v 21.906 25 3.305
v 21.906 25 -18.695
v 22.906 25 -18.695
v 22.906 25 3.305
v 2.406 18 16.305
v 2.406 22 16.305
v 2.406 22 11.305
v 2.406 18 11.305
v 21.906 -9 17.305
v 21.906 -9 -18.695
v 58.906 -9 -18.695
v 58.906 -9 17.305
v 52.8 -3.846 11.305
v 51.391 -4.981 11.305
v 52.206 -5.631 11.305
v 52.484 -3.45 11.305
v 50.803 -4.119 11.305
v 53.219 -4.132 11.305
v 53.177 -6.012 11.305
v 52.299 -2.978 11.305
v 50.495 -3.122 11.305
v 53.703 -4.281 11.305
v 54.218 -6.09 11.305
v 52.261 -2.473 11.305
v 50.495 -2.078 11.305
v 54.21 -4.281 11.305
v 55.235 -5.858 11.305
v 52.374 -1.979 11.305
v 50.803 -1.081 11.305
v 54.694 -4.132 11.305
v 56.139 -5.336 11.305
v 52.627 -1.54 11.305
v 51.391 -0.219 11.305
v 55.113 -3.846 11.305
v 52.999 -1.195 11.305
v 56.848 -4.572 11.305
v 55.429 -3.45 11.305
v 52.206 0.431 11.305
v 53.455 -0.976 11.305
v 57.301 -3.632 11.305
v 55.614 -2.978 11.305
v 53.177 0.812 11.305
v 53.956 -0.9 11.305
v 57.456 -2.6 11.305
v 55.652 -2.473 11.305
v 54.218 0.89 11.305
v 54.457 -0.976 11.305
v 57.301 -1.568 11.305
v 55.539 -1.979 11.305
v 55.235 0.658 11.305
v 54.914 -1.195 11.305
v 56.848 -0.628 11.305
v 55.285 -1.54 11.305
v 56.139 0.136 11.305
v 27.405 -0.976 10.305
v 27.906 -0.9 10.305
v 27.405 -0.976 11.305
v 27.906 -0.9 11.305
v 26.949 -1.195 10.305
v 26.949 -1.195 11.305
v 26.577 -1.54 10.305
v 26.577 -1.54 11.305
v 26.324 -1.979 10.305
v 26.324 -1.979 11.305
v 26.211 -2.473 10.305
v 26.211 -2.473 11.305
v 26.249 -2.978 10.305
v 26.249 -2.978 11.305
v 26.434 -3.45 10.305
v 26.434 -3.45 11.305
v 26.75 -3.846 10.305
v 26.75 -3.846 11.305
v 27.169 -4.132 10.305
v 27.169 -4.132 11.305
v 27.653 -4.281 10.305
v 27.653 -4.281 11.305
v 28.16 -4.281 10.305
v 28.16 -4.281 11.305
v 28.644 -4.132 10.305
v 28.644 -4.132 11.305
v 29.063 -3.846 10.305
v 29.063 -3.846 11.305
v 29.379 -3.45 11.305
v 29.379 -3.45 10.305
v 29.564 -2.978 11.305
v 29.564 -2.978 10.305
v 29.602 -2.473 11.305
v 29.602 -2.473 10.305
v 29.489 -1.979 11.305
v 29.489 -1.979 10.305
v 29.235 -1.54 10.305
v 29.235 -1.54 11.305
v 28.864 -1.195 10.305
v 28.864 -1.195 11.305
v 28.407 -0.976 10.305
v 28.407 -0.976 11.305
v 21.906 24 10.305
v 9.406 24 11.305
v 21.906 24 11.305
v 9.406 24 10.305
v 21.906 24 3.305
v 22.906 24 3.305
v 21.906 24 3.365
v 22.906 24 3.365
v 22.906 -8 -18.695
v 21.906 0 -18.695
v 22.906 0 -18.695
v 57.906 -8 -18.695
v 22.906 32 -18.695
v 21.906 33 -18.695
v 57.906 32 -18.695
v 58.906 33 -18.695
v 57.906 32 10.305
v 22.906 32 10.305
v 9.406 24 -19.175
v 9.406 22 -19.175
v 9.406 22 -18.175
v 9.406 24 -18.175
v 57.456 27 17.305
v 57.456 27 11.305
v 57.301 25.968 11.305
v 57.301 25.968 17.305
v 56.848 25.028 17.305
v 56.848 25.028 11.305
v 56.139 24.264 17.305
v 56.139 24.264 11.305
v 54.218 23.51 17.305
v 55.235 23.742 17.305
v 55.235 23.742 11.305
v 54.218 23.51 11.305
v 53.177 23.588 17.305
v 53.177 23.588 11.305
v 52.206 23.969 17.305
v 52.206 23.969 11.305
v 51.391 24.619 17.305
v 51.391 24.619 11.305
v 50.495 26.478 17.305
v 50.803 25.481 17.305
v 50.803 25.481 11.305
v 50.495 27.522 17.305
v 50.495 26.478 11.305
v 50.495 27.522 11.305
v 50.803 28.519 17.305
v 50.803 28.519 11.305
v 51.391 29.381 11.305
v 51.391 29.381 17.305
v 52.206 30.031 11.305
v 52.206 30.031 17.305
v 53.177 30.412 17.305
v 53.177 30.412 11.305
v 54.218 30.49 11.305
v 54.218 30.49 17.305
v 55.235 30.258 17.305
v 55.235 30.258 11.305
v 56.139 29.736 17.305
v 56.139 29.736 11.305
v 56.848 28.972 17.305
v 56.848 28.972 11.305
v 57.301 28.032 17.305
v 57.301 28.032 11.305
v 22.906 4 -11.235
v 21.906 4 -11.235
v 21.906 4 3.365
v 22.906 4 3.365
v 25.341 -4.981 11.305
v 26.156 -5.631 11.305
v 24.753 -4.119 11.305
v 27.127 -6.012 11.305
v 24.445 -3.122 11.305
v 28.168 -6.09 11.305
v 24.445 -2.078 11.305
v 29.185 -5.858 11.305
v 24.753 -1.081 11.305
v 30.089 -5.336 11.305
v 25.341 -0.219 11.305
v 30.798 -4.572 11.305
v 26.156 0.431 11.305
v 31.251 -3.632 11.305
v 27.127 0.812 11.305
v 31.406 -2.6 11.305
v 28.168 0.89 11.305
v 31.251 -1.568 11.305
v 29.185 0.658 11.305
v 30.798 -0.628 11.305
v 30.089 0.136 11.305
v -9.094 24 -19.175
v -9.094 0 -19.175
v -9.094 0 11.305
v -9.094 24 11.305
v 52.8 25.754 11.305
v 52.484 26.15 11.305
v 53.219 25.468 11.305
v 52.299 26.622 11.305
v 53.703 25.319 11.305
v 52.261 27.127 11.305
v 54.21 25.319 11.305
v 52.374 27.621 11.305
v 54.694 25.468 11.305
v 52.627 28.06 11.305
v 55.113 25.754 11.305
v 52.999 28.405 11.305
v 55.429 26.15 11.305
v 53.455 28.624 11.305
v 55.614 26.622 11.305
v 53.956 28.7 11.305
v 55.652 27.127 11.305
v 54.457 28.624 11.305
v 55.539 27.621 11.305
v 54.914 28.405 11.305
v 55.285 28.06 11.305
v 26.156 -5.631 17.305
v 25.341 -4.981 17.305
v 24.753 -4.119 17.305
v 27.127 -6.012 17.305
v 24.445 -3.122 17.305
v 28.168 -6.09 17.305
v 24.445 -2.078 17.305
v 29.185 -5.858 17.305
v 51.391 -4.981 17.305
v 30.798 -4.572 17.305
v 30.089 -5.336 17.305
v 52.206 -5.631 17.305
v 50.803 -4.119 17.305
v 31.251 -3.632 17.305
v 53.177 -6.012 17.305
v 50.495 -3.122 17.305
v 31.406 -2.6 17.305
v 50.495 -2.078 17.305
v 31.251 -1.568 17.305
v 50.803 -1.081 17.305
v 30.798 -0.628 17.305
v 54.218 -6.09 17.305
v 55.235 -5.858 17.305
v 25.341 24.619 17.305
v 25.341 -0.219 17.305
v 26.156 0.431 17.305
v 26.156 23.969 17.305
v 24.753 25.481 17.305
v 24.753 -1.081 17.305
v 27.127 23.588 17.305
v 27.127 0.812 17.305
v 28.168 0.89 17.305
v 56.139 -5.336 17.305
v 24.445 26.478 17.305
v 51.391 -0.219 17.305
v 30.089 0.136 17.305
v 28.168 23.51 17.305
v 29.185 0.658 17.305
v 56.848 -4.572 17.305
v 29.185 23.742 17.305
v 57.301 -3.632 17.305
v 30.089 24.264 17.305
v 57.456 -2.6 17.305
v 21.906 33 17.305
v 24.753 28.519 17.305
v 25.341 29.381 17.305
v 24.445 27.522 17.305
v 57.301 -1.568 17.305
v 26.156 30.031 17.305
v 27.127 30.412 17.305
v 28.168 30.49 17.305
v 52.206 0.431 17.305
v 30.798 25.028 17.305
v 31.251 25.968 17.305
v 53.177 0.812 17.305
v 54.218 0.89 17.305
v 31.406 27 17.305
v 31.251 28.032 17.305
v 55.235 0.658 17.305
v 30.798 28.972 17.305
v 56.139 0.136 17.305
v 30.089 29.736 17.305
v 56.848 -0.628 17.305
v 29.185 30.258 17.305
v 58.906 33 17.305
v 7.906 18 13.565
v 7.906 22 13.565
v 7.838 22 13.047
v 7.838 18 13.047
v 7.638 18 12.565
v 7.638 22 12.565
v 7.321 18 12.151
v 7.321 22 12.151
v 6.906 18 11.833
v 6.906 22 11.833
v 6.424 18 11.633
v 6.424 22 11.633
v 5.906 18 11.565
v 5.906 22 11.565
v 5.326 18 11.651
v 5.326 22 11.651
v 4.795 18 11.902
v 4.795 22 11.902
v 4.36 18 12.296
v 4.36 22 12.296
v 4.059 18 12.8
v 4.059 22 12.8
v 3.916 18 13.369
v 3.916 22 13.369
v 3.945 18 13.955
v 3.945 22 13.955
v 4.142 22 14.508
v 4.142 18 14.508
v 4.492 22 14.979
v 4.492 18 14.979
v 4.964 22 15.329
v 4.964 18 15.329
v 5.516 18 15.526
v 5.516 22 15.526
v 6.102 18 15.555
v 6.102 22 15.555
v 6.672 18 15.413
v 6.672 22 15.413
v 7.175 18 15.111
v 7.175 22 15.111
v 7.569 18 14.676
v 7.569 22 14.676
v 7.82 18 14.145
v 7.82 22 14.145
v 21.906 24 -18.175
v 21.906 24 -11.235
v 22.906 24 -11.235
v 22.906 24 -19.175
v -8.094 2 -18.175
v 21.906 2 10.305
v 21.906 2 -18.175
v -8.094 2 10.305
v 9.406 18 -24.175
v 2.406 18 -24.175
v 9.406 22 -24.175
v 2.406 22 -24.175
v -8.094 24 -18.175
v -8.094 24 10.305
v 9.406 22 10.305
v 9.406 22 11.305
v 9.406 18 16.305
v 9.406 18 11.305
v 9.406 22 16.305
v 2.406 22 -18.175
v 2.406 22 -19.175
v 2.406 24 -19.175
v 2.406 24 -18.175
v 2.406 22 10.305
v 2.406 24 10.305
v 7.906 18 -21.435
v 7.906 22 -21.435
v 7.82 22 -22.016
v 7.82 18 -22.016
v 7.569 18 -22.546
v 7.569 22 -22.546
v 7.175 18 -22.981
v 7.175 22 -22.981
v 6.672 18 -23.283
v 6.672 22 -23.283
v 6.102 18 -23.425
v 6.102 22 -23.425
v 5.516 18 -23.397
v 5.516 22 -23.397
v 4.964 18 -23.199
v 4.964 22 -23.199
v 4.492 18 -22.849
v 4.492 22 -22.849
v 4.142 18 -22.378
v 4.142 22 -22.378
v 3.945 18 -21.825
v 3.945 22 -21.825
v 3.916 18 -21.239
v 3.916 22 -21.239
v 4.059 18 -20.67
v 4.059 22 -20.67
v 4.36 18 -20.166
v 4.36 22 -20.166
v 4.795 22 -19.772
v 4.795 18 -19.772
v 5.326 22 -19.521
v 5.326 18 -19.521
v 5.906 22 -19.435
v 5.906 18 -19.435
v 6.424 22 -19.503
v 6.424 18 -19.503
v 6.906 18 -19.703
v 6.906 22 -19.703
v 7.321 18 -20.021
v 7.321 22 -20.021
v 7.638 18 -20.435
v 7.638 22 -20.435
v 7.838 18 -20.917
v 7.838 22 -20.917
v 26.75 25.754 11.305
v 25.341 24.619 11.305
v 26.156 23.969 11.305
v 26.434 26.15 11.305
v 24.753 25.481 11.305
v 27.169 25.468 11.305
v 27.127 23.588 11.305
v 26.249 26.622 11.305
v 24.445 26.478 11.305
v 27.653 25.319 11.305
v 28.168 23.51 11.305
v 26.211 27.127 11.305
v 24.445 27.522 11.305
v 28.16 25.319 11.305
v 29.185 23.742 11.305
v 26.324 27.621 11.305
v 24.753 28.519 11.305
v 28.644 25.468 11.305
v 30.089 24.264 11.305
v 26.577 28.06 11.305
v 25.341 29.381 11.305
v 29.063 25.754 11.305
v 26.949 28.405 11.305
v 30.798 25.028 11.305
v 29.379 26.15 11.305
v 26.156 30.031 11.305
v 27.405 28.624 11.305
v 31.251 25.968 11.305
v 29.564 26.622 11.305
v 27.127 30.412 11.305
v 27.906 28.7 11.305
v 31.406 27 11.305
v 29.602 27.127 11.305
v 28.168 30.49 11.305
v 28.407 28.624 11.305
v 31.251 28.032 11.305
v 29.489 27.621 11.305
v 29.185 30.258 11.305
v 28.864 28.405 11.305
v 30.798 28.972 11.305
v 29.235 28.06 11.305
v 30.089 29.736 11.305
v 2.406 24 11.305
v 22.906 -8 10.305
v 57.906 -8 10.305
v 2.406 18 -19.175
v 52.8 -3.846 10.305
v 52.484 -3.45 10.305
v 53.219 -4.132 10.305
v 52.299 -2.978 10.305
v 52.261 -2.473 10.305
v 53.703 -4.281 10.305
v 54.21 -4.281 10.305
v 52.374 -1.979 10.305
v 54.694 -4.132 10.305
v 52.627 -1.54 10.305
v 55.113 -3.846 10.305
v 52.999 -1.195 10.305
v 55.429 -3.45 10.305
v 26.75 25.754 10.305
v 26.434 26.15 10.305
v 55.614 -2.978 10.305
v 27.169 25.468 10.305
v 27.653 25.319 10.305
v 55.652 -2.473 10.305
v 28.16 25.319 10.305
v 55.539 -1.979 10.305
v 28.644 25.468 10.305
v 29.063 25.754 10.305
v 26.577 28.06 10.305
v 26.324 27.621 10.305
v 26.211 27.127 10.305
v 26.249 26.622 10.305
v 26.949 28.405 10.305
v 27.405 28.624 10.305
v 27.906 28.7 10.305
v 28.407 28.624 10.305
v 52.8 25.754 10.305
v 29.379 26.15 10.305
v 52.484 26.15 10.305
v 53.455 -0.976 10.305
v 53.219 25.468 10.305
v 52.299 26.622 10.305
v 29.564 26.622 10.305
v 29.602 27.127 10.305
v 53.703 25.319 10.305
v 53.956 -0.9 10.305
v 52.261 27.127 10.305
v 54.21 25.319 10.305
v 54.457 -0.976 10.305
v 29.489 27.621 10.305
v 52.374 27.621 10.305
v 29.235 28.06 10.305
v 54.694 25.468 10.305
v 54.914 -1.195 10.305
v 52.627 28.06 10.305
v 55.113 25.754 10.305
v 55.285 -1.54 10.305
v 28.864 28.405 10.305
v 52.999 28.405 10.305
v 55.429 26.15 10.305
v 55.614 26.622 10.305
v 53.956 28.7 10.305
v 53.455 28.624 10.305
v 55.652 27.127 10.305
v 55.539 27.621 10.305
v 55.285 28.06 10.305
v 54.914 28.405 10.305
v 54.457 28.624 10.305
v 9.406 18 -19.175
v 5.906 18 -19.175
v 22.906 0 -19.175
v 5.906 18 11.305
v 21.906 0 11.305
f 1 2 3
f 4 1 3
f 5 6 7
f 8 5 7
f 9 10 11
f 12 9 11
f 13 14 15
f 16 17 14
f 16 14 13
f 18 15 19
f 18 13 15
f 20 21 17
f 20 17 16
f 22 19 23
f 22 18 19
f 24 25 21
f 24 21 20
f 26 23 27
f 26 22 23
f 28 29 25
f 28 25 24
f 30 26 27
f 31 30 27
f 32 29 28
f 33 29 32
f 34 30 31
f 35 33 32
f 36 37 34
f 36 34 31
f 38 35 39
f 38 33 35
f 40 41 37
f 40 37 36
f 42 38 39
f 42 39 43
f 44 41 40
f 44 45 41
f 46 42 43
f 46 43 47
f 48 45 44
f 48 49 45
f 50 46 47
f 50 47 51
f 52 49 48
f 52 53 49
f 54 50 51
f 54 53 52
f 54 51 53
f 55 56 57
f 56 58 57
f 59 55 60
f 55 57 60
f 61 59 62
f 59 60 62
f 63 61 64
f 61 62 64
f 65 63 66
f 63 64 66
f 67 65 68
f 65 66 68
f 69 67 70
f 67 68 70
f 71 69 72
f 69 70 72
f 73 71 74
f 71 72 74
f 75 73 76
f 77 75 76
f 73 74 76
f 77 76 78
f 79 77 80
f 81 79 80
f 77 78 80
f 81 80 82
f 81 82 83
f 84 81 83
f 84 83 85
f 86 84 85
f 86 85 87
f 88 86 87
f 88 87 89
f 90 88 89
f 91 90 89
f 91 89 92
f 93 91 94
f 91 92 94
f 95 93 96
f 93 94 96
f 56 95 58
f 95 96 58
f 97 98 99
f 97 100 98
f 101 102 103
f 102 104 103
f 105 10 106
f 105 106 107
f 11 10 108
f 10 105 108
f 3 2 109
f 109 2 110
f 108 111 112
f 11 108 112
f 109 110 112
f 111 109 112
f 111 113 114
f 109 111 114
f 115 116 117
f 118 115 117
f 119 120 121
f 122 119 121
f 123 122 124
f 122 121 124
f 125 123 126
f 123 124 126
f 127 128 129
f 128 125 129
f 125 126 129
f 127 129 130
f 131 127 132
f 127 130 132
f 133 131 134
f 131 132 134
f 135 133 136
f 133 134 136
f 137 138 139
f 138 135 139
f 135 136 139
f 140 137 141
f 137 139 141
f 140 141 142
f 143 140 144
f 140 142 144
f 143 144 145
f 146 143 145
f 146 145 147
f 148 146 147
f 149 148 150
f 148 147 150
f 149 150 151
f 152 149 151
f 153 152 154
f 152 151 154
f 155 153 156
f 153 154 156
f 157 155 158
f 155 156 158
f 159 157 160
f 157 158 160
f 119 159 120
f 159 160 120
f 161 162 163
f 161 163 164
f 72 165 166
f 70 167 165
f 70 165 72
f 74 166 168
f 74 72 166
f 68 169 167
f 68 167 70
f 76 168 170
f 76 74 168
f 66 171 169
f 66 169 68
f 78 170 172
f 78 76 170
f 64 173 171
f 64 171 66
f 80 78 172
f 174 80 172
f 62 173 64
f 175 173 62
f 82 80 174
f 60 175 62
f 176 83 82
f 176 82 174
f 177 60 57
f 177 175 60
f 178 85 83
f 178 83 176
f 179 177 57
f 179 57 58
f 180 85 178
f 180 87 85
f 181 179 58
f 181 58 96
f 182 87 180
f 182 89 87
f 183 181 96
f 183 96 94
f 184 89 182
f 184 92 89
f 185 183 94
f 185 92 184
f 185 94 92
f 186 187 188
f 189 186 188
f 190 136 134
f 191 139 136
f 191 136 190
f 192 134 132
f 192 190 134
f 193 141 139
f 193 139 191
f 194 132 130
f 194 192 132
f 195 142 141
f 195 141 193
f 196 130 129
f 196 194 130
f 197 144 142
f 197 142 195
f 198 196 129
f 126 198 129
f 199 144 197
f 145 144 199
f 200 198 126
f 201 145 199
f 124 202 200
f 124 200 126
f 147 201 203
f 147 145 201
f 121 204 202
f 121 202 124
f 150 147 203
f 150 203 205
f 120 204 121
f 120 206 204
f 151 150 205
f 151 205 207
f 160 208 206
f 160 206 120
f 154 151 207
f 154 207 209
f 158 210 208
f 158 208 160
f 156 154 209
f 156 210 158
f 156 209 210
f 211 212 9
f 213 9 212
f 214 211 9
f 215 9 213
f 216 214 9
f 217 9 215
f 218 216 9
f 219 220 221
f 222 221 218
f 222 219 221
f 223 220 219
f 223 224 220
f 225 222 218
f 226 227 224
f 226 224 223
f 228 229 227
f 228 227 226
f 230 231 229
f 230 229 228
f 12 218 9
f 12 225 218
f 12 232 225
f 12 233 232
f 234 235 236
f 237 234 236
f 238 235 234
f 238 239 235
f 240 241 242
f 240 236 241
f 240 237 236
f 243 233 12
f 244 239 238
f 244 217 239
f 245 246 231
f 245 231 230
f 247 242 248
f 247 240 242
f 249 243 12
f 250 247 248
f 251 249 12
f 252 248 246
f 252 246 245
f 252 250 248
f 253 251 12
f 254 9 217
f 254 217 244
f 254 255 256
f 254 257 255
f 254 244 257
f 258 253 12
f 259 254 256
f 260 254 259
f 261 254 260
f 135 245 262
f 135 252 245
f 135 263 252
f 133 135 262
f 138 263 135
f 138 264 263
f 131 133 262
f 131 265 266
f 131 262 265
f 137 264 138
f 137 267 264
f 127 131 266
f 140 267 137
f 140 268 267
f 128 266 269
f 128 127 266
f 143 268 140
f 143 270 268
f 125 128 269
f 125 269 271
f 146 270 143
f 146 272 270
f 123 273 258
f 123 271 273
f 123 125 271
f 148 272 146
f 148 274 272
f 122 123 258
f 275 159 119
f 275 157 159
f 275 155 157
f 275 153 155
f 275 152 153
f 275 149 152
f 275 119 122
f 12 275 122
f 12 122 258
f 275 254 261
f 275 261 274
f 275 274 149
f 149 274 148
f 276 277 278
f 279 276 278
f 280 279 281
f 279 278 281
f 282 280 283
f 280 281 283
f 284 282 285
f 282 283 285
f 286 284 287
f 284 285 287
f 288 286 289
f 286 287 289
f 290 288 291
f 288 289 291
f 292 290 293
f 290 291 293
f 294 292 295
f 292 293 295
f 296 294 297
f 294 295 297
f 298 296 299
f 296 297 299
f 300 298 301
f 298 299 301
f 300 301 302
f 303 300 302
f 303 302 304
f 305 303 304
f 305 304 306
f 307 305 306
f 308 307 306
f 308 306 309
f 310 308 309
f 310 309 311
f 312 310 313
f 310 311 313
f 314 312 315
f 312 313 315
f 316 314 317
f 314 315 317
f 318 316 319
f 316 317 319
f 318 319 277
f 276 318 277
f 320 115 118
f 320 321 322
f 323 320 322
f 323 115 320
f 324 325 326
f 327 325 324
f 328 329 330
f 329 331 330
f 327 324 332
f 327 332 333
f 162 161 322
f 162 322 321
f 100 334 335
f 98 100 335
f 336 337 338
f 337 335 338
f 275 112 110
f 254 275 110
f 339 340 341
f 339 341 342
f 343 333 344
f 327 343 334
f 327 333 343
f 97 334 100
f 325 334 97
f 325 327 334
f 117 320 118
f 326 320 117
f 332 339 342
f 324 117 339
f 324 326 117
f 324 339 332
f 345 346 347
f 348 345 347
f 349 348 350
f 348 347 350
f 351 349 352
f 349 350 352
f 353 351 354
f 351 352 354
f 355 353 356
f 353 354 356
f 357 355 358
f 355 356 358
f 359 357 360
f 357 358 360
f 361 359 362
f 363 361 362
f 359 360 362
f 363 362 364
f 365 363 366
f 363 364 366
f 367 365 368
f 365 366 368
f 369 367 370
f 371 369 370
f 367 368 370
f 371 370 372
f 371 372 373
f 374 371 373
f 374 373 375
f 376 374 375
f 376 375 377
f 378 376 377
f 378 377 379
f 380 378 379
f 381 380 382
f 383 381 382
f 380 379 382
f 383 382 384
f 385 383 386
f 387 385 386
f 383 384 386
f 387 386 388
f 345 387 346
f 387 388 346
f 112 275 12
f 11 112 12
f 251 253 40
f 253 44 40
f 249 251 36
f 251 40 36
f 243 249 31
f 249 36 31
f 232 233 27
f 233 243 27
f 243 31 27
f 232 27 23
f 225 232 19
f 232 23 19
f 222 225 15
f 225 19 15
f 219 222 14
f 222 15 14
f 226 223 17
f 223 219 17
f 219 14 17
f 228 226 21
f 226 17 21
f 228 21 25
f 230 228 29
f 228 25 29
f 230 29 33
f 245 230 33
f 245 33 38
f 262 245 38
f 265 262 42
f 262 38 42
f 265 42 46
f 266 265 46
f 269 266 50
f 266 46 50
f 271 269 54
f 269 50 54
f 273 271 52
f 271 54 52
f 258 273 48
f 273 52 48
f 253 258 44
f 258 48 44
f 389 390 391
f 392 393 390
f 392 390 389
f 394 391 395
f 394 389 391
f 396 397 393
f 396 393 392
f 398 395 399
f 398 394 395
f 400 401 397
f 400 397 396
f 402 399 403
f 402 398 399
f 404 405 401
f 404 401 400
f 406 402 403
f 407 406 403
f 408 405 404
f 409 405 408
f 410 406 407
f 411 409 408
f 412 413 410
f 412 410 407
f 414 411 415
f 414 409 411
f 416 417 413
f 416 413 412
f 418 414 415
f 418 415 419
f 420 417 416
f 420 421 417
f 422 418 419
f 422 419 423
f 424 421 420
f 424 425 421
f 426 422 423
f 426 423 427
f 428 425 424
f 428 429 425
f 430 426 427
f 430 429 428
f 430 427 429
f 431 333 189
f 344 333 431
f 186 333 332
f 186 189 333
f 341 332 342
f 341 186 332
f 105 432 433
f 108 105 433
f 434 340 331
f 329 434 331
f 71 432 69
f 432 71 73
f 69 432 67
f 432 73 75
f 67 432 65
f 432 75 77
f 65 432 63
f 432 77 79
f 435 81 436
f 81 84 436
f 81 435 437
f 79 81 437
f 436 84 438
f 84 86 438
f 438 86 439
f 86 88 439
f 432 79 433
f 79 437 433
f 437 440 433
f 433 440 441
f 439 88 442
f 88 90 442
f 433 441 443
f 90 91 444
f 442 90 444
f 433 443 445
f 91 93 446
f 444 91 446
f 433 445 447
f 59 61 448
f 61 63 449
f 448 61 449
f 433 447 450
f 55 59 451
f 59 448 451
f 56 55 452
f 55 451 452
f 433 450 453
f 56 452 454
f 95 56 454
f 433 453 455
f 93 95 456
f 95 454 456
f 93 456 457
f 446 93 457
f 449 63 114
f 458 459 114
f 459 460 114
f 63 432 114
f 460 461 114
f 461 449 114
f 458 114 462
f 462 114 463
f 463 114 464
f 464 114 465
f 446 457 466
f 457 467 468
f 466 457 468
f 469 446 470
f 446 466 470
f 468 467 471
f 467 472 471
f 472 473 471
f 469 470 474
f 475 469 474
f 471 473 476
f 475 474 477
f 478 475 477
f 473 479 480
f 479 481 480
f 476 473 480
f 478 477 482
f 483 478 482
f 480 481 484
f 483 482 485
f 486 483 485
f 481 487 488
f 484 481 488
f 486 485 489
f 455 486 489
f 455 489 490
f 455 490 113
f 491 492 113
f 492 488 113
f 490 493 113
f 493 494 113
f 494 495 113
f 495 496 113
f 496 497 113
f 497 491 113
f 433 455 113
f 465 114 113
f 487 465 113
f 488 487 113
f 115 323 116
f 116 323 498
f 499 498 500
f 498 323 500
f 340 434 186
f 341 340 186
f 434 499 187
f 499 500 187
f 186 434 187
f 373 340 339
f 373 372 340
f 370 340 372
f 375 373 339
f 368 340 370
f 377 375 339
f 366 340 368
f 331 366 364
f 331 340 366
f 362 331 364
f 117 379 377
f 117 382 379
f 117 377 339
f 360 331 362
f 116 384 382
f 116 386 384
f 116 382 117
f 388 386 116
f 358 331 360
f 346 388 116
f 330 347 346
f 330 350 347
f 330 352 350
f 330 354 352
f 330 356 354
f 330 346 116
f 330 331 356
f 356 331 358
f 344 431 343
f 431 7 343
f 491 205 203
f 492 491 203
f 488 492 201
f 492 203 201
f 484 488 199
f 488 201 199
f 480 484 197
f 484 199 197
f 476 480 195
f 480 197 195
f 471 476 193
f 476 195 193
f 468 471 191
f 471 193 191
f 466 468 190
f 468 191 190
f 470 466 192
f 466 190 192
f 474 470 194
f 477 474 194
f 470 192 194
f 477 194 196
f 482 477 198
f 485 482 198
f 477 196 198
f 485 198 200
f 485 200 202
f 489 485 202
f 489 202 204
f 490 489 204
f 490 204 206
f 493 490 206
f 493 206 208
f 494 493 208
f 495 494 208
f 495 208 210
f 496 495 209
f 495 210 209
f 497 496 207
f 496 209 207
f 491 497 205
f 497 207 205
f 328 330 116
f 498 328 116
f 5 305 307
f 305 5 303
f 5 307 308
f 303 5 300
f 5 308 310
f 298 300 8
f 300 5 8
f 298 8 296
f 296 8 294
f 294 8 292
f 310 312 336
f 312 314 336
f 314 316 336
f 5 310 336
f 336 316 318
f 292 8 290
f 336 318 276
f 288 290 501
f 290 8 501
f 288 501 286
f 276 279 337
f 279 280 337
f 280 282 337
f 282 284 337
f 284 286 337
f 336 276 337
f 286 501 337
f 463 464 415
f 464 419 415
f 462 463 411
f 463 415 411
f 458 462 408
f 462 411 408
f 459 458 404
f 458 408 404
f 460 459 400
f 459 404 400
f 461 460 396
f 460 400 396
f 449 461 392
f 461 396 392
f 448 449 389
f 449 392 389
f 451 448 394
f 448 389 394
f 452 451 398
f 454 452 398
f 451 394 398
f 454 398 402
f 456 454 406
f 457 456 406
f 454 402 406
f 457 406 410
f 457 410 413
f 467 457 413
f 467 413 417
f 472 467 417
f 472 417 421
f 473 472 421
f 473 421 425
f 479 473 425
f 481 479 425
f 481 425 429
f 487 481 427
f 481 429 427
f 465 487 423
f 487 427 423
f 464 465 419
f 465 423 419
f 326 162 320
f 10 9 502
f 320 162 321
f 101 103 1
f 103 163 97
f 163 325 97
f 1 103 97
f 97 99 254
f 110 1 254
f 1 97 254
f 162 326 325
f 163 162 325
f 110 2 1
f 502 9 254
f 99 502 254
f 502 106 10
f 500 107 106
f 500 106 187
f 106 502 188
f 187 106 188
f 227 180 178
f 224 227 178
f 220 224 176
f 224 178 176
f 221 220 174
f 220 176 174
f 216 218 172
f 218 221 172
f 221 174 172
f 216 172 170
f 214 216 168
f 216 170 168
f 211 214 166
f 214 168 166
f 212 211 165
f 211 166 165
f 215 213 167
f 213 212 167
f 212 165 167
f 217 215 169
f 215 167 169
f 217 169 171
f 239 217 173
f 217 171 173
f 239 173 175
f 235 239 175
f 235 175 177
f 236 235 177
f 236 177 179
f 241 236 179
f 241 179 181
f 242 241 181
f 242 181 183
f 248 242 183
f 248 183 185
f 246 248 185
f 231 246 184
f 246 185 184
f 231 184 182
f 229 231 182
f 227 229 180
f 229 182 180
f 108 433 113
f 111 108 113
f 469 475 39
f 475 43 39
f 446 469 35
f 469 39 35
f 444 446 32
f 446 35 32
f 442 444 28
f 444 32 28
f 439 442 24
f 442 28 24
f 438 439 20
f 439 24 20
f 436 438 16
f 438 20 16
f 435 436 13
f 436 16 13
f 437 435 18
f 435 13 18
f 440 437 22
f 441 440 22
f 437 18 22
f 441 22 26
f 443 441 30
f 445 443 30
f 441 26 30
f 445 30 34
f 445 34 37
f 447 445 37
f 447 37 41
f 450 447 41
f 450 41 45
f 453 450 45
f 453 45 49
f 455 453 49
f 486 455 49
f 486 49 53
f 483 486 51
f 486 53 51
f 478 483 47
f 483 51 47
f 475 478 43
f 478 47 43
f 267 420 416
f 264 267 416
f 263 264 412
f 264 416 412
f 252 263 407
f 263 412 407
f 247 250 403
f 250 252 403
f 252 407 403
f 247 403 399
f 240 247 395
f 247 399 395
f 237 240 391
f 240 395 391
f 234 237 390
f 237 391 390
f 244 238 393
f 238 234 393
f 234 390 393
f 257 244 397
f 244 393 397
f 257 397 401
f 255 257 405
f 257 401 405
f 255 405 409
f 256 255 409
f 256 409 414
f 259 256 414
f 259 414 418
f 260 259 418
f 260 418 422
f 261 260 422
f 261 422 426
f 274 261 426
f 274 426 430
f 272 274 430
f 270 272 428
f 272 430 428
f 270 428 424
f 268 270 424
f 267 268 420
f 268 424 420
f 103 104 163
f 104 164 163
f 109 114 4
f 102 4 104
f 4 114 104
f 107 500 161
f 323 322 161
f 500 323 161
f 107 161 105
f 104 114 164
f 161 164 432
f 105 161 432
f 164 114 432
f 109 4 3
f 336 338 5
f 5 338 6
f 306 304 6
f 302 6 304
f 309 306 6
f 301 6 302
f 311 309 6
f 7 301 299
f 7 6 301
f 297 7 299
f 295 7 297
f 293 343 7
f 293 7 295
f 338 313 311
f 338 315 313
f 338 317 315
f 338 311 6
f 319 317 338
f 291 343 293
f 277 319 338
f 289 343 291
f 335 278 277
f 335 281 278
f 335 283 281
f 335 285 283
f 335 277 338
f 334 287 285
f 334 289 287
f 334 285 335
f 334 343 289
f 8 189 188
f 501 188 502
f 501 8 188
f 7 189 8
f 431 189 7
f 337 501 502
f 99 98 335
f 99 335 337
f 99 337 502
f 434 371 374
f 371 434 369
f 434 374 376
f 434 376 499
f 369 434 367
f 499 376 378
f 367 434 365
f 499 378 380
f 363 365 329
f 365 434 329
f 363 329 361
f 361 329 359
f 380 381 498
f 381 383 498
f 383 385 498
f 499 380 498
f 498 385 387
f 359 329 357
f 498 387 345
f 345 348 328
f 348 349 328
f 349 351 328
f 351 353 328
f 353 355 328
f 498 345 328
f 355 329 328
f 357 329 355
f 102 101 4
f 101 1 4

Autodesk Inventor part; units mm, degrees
ref_plane "YZ Plane" through (0, 0, 0) normal (1, 0, 0) x (0, 1, 0)
ref_plane "XZ Plane" through (0, 0, 0) normal (0, 1, 0) x (-1, 0, 0)
ref_plane "XY Plane" through (0, 0, 0) normal (0, 0, 1) x (1, 0, 0)
sketch "Sketch1" plane through (0, 0, 0) normal (0, 1, 0) x (-1, 0, 0)
  line L0 (9.0944, 11.3049) -> (-22.9063, 11.3049)
  line L1 (9.0944, 11.3049) -> (41.0951, 11.3049) construction
  line L2 (-22.9063, 11.3049) -> (-22.9063, -19.1751)
  line L3 (-22.9063, -19.1751) -> (9.0944, -19.1751)
  line L4 (9.0944, -19.1751) -> (9.0944, 11.3049)
  point P0 (0, 0)
  dimension "d0" = 32.0007
  dimension "d1" = 180
  dimension "d2" = 30.48
extrude "Extrusion1" add sketch "Sketch1" along normal blind 2
sketch "Sketch2" plane through (0, 2, 0) normal (0, 1, 0) x (1, 0, 0)
  line L0 (-9.0944, 19.1751) -> (-9.0944, -11.3049)
  line L1 (-9.0944, -11.3049) -> (-9.0944, -10.3049)
  line L2 (-9.0944, -10.3049) -> (-8.0944, -10.3049)
  line L3 (-9.0944, 19.1751) -> (-8.0944, 19.1751)
  line L4 (22.9063, 19.1751) -> (-9.0944, 19.1751)
  line L5 (-8.0944, 19.1751) -> (-8.0944, 18.1751)
  line L6 (22.9063, 19.1751) -> (21.9063, 19.1751)
  line L7 (21.9063, 19.1751) -> (21.9063, 18.1751)
  line L8 (22.9063, -11.3049) -> (22.9063, 19.1751)
  line L9 (22.9063, -11.3049) -> (22.9063, -10.3049)
  line L10 (21.9063, -10.3049) -> (22.9063, -10.3049)
  line L11 (-8.0944, -10.3049) -> (21.9063, -10.3049)
  line L12 (21.9063, -10.3049) -> (21.9063, 18.1751)
  line L13 (21.9063, 18.1751) -> (-8.0944, 18.1751)
  line L14 (-8.0944, 18.1751) -> (-8.0944, -10.3049)
  line L15 (-9.0944, -11.3049) -> (22.9063, -11.3049)
  line L16 (22.9063, -11.3049) -> (22.9063, 19.1751)
  line L17 (22.9063, 19.1751) -> (-9.0944, 19.1751)
  line L18 (-9.0944, 19.1751) -> (-9.0944, -11.3049)
  line L19 (22.9063, -11.3049) -> (22.9063, -3.3649)
  line L20 (22.9063, 19.1751) -> (22.9063, 11.2351)
  line L21 (22.9063, -3.3649) -> (21.9063, -3.3649)
  line L22 (22.9063, 11.2351) -> (21.9063, 11.2351)
  point P0 (0, 0)
  point P1 (22.9063, -3.3649)
  point P2 (22.9063, 11.2351)
  dimension "d5" = 1
  dimension "d6" = 1
  dimension "d7" = 1
  dimension "d8" = 1
  dimension "d11" = 7.94
  dimension "d12" = 7.94
extrude "Extrusion3" add sketch "Sketch2" along normal blind 20 contours L3 L5 L14 L2 L0 | L2 L11 L10 L8 L15 L0 | L4 L7 L13 L5 | L4 L8 L22 L12 L7 | L12 L21 L8 L10
sketch "Sketch3" plane through (0, 2, 0) normal (0, 1, 0) x (1, 0, 0)
  line L0 (21.9063, -10.3049) -> (21.9063, -3.3649)
  line L1 (22.9063, 11.2351) -> (21.9063, 11.2351)
  line L2 (21.9063, -3.3649) -> (21.9063, 11.2351)
  line L3 (21.9063, 11.2351) -> (22.9063, 11.2351)
  line L4 (22.9063, -3.3649) -> (22.9063, 11.2351)
  line L5 (22.9063, 11.2351) -> (22.9063, -3.3649)
  line L6 (22.9063, -3.3649) -> (21.9063, -3.3649)
  point P0 (0, 0)
extrude "Extrusion4" add sketch "Sketch3" along normal blind 2
sketch "Sketch4" plane through (0, 22, 0) normal (0, 1, 0) x (1, 0, 0)
  line L0 (22.9063, -11.3049) -> (22.9063, 19.1751)
  line L1 (22.9063, 3.9351) -> (5.9063, 3.9351)
  line L2 (5.9063, 3.9351) -> (5.9063, 21.4351)
  line L3 (5.9063, 21.4351) -> (5.9063, -13.5649)
  circle A0 centre (5.9063, -13.5649) radius 2
  circle A1 centre (5.9063, 21.4351) radius 2
  line L4 (22.9063, 19.1751) -> (-9.0944, 19.1751)
  line L5 (5.9063, 19.1751) -> (2.4063, 19.1751)
  line L6 (2.4063, 19.1751) -> (2.4063, 24.1751)
  line L7 (2.4063, 24.1751) -> (9.4063, 24.1751)
  line L8 (9.4063, 24.1751) -> (9.4063, 19.1751)
  line L9 (9.4063, -11.3049) -> (9.4063, -16.3049)
  line L10 (9.4063, -16.3049) -> (2.4063, -16.3049)
  line L11 (2.4063, -16.3049) -> (2.4063, -11.3049)
  line L12 (-9.0944, -11.3049) -> (22.9063, -11.3049)
  point P0 (0, 0)
  dimension "d17" = 17
  dimension "d18" = 17.5
  dimension "d19" = 35
  dimension "d20" = 4
  dimension "d21" = 4
  dimension "d22" = 3.5
  dimension "d23" = 5
  dimension "d24" = 7
  dimension "d25" = 5
extrude "Extrusion5" add sketch "Sketch4" against normal blind 4 contours L9 L10 L11 L12 | L4 L6 L7 L8
sketch "Sketch5" plane through (0, 22, 0) normal (0, 1, 0) x (1, 0, 0)
  line L0 (2.4063, 19.1751) -> (2.4063, 24.1751)
  line L1 (2.4063, 19.1751) -> (2.4063, 18.1751)
  line L2 (-8.0944, 18.1751) -> (21.9063, 18.1751)
  line L3 (22.9063, 19.1751) -> (9.4063, 19.1751)
  line L4 (9.4063, 19.1751) -> (9.4063, 18.1751)
  line L5 (-9.0944, -11.3049) -> (22.9063, -11.3049)
  line L6 (2.4063, -11.3049) -> (2.4063, -10.3049)
  line L7 (-8.0944, -10.3049) -> (21.9063, -10.3049)
  line L8 (9.4063, -10.3049) -> (9.4063, -11.3049)
  circle A0 centre (5.9063, 21.4351) radius 2
  circle A1 centre (5.9063, -13.5649) radius 2
  line L9 (21.9063, -10.3049) -> (-8.0944, -10.3049)
  line L10 (-8.0944, -10.3049) -> (-8.0944, 18.1751)
  line L11 (-8.0944, 18.1751) -> (21.9063, 18.1751)
  line L12 (21.9063, 18.1751) -> (21.9063, 11.2351)
  line L13 (21.9063, 11.2351) -> (22.9063, 11.2351)
  line L14 (22.9063, 11.2351) -> (22.9063, 19.1751)
  line L15 (22.9063, 19.1751) -> (9.4063, 19.1751)
  line L16 (9.4063, 19.1751) -> (9.4063, 24.1751)
  line L17 (9.4063, 24.1751) -> (2.4063, 24.1751)
  line L18 (2.4063, 24.1751) -> (2.4063, 19.1751)
  line L19 (2.4063, 19.1751) -> (-9.0944, 19.1751)
  line L20 (-9.0944, 19.1751) -> (-9.0944, -11.3049)
  line L21 (-9.0944, -11.3049) -> (2.4063, -11.3049)
  line L22 (2.4063, -11.3049) -> (2.4063, -16.3049)
  line L23 (2.4063, -16.3049) -> (9.4063, -16.3049)
  line L24 (9.4063, -16.3049) -> (9.4063, -11.3049)
  line L25 (9.4063, -11.3049) -> (22.9063, -11.3049)
  line L26 (22.9063, -11.3049) -> (22.9063, -3.3649)
  line L27 (22.9063, -3.3649) -> (21.9063, -3.3649)
  line L28 (21.9063, -3.3649) -> (21.9063, -10.3049)
  point P0 (0, 0)
  point P1 (-8.0944, 18.1751)
  point P2 (22.9063, 19.1751)
extrude "Extrusion6" add sketch "Sketch5" along normal blind 2 contours L1 L2 L10 L7 L6 L5 L20 L19 | L4 L3 L14 L13 L12 L2 | L8 L7 L28 L27 L26 L5
sketch "Sketch35" plane through (-9.0944, 0, 11.3049) normal (0, 0, 1) x (1, 0, 0)
  line L0 (32.0007, 0) -> (32.0007, 24)
  line L1 (32.0007, 12) -> (32.0007, 32)
  line L2 (32.0007, 32) -> (67.0007, 32)
  line L3 (67.0007, 32) -> (67.0007, -8)
  line L4 (67.0007, -8) -> (32.0007, -8)
  line L5 (32.0007, -8) -> (32.0007, 0)
  point P0 (9.0944, 0)
  dimension "d177" = 20
  dimension "d178" = 35
  dimension "d179" = 40
extrude "Extrusion32" add sketch "Sketch35" against normal blind 1
sketch "Sketch36" plane through (-9.0944, 0, 10.3049) normal (0, 0, -1) x (-1, 0, 0)
  line L0 (-32.0007, 32) -> (-32.0007, 24)
  line L1 (-32.0007, 32) -> (-37.0007, 32)
  line L2 (-32.0007, 32) -> (-67.0007, 32)
  line L3 (-37.0007, 32) -> (-37.0007, 27)
  line L4 (-37.0007, 27) -> (-37.0007, -2.6)
  line L5 (-37.0007, -2.6) -> (-63.0507, -2.6)
  line L6 (-63.0507, -2.6) -> (-63.0507, 27)
  point P0 (-9.0944, 0)
  dimension "d182" = 5
  dimension "d183" = 5
  dimension "d184" = 29.6
  dimension "d185" = 26.05
  dimension "d186" = 29.6
  dimension "d187" = 90
hole "Hole3" at (27.9063, 27, 10.3049) at (53.9563, 27, 10.3049) at (53.9563, -2.6, 10.3049) at (27.9063, -2.6, 10.3049) direction (0, 0, 1) diameter 3.4 end through all
sketch "Sketch37" plane through (-9.0944, 0, 10.3049) normal (0, 0, -1) x (-1, 0, 0)
  point P0 (-9.0944, 0)
sketch "Sketch38" plane through (2.4063, 18, 11.3049) normal (0, 0, 1) x (1, 0, 0)
  line L0 (20.5, -18) -> (20.5, 6)
  line L1 (19.5, -16) -> (19.5, 6)
  line L2 (20.5, 6) -> (19.5, 6)
  line L3 (19.5, 6) -> (19.5, 15)
  line L4 (19.5, 15) -> (56.5, 15)
  line L5 (56.5, 15) -> (56.5, -27)
  line L6 (56.5, -27) -> (19.5, -27)
  line L7 (19.5, -27) -> (19.5, 15)
  circle A0 centre (51.55, -20.6) radius 1.7
  circle A1 centre (25.5, 9) radius 1.7
  circle A2 centre (51.55, 9) radius 1.7
  circle A3 centre (25.5, -20.6) radius 1.7
  line L8 (0, 0) -> (0, 4)
  line L9 (0, 4) -> (0, 6)
  line L10 (-11.5007, 6) -> (0, 6)
  line L11 (-11.5007, -18) -> (-11.5007, 6)
  line L12 (-11.5007, -18) -> (20.5, -18)
  line L13 (20.5, -18) -> (20.5, -26)
  line L14 (20.5, -26) -> (55.5, -26)
  line L15 (55.5, -26) -> (55.5, 14)
  line L16 (55.5, 14) -> (20.5, 14)
  line L17 (20.5, 14) -> (20.5, 6)
  line L18 (7, 6) -> (20.5, 6)
  line L19 (7, 4) -> (7, 6)
  line L20 (7, 4) -> (7, 0)
  line L21 (7, 0) -> (0, 0)
  line L22 (20.5, 15) -> (21.5, 15)
  line L23 (21.5, 15) -> (21.5, 6)
  line L24 (20.5, 6) -> (20.5, 14)
  line L25 (21.5, 6) -> (20.5, 6)
  line L26 (20.5, -26) -> (21.5, -26)
  line L27 (55.5, -26) -> (20.5, -26)
  line L28 (21.5, -26) -> (21.5, -18)
  line L29 (20.5, -18) -> (-11.5007, -18)
  line L30 (21.5, -18) -> (20.5, -18)
  line L31 (20.5, -26) -> (20.5, -27)
  line L32 (20.5, 14) -> (20.5, 15)
  line L33 (19.5, -16) -> (19.5, 6)
  line L34 (19.5, 6) -> (19.5, 7)
  line L35 (19.5, 7) -> (20.5, 7)
  point P0 (-2.4063, -18)
  point P1 (19.5, 7)
  point P2 (20.5, 7)
  point P3 (19.5, -18)
  dimension "d195" = 1
  dimension "d196" = 9
  dimension "d197" = 37
  dimension "d198" = 42
  dimension "d199" = 1
  dimension "d200" = 1
  dimension "d201" = 1
extrude "Extrusion33" add sketch "Sketch38" against normal blind 30 contours L13 L31 L6 L7 L12 | L14 L15 L16 L23 L4 L5 L6 L31 | L35 L3 L4 L32 L17 | L32 L4 L23 L16
sketch "Sketch42" plane through (2.4063, 18, 11.3049) normal (0, 0, 1) x (1, 0, 0)
  circle A0 centre (25.5, 9) radius 1.7
  circle A1 centre (25.5, 9) radius 3.5
  circle A2 centre (51.55, 9) radius 1.7
  circle A3 centre (51.55, 9) radius 3.5
  circle A4 centre (51.55, -20.6) radius 1.7
  circle A5 centre (51.55, -20.6) radius 3.5
  circle A6 centre (25.5, -20.6) radius 1.7
  circle A7 centre (25.5, -20.6) radius 3.5
  circle A8 centre (51.55, -20.6) radius 1.7
  circle A9 centre (25.5, 9) radius 1.7
  circle A10 centre (51.55, 9) radius 1.7
  circle A11 centre (25.5, -20.6) radius 1.7
  line L0 (0, 0) -> (0, 4)
  line L1 (0, 4) -> (0, 6)
  line L2 (-11.5007, 6) -> (0, 6)
  line L3 (-11.5007, -18) -> (-11.5007, 6)
  line L4 (-11.5007, -18) -> (19.5, -18)
  line L5 (19.5, -18) -> (19.5, -27)
  line L6 (19.5, -27) -> (56.5, -27)
  line L7 (56.5, -27) -> (56.5, 15)
  line L8 (56.5, 15) -> (19.5, 15)
  line L9 (19.5, 15) -> (19.5, 7)
  line L10 (19.5, 7) -> (20.5, 7)
  line L11 (20.5, 7) -> (20.5, 6)
  line L12 (7, 6) -> (20.5, 6)
  line L13 (7, 4) -> (7, 6)
  line L14 (7, 4) -> (7, 0)
  line L15 (7, 0) -> (0, 0)
  line L16 (19.5, -14) -> (19.5, 6)
  line L17 (19.5, 6) -> (19.5, -18)
  line L18 (20.5, -18) -> (20.5, 6)
  line L19 (19.5, 15) -> (19.5, 7)
  line L20 (19.5, 7) -> (19.5, 6)
  point P0 (-2.4063, -18)
  dimension "d224" = 7
  dimension "d225" = 7
  dimension "d226" = 7
  dimension "d227" = 7
extrude "Extrusion37" add sketch "Sketch42" along normal blind 6 contours L20 L10 L11 L12 | L12 L11 L10 L9 L8 L7 L6 L5 L17 L16
extrude "Extrusion38" add sketch "Sketch38" against normal blind 8 contours L2 L3 L35 L17
properties part number "shell 3.0"
